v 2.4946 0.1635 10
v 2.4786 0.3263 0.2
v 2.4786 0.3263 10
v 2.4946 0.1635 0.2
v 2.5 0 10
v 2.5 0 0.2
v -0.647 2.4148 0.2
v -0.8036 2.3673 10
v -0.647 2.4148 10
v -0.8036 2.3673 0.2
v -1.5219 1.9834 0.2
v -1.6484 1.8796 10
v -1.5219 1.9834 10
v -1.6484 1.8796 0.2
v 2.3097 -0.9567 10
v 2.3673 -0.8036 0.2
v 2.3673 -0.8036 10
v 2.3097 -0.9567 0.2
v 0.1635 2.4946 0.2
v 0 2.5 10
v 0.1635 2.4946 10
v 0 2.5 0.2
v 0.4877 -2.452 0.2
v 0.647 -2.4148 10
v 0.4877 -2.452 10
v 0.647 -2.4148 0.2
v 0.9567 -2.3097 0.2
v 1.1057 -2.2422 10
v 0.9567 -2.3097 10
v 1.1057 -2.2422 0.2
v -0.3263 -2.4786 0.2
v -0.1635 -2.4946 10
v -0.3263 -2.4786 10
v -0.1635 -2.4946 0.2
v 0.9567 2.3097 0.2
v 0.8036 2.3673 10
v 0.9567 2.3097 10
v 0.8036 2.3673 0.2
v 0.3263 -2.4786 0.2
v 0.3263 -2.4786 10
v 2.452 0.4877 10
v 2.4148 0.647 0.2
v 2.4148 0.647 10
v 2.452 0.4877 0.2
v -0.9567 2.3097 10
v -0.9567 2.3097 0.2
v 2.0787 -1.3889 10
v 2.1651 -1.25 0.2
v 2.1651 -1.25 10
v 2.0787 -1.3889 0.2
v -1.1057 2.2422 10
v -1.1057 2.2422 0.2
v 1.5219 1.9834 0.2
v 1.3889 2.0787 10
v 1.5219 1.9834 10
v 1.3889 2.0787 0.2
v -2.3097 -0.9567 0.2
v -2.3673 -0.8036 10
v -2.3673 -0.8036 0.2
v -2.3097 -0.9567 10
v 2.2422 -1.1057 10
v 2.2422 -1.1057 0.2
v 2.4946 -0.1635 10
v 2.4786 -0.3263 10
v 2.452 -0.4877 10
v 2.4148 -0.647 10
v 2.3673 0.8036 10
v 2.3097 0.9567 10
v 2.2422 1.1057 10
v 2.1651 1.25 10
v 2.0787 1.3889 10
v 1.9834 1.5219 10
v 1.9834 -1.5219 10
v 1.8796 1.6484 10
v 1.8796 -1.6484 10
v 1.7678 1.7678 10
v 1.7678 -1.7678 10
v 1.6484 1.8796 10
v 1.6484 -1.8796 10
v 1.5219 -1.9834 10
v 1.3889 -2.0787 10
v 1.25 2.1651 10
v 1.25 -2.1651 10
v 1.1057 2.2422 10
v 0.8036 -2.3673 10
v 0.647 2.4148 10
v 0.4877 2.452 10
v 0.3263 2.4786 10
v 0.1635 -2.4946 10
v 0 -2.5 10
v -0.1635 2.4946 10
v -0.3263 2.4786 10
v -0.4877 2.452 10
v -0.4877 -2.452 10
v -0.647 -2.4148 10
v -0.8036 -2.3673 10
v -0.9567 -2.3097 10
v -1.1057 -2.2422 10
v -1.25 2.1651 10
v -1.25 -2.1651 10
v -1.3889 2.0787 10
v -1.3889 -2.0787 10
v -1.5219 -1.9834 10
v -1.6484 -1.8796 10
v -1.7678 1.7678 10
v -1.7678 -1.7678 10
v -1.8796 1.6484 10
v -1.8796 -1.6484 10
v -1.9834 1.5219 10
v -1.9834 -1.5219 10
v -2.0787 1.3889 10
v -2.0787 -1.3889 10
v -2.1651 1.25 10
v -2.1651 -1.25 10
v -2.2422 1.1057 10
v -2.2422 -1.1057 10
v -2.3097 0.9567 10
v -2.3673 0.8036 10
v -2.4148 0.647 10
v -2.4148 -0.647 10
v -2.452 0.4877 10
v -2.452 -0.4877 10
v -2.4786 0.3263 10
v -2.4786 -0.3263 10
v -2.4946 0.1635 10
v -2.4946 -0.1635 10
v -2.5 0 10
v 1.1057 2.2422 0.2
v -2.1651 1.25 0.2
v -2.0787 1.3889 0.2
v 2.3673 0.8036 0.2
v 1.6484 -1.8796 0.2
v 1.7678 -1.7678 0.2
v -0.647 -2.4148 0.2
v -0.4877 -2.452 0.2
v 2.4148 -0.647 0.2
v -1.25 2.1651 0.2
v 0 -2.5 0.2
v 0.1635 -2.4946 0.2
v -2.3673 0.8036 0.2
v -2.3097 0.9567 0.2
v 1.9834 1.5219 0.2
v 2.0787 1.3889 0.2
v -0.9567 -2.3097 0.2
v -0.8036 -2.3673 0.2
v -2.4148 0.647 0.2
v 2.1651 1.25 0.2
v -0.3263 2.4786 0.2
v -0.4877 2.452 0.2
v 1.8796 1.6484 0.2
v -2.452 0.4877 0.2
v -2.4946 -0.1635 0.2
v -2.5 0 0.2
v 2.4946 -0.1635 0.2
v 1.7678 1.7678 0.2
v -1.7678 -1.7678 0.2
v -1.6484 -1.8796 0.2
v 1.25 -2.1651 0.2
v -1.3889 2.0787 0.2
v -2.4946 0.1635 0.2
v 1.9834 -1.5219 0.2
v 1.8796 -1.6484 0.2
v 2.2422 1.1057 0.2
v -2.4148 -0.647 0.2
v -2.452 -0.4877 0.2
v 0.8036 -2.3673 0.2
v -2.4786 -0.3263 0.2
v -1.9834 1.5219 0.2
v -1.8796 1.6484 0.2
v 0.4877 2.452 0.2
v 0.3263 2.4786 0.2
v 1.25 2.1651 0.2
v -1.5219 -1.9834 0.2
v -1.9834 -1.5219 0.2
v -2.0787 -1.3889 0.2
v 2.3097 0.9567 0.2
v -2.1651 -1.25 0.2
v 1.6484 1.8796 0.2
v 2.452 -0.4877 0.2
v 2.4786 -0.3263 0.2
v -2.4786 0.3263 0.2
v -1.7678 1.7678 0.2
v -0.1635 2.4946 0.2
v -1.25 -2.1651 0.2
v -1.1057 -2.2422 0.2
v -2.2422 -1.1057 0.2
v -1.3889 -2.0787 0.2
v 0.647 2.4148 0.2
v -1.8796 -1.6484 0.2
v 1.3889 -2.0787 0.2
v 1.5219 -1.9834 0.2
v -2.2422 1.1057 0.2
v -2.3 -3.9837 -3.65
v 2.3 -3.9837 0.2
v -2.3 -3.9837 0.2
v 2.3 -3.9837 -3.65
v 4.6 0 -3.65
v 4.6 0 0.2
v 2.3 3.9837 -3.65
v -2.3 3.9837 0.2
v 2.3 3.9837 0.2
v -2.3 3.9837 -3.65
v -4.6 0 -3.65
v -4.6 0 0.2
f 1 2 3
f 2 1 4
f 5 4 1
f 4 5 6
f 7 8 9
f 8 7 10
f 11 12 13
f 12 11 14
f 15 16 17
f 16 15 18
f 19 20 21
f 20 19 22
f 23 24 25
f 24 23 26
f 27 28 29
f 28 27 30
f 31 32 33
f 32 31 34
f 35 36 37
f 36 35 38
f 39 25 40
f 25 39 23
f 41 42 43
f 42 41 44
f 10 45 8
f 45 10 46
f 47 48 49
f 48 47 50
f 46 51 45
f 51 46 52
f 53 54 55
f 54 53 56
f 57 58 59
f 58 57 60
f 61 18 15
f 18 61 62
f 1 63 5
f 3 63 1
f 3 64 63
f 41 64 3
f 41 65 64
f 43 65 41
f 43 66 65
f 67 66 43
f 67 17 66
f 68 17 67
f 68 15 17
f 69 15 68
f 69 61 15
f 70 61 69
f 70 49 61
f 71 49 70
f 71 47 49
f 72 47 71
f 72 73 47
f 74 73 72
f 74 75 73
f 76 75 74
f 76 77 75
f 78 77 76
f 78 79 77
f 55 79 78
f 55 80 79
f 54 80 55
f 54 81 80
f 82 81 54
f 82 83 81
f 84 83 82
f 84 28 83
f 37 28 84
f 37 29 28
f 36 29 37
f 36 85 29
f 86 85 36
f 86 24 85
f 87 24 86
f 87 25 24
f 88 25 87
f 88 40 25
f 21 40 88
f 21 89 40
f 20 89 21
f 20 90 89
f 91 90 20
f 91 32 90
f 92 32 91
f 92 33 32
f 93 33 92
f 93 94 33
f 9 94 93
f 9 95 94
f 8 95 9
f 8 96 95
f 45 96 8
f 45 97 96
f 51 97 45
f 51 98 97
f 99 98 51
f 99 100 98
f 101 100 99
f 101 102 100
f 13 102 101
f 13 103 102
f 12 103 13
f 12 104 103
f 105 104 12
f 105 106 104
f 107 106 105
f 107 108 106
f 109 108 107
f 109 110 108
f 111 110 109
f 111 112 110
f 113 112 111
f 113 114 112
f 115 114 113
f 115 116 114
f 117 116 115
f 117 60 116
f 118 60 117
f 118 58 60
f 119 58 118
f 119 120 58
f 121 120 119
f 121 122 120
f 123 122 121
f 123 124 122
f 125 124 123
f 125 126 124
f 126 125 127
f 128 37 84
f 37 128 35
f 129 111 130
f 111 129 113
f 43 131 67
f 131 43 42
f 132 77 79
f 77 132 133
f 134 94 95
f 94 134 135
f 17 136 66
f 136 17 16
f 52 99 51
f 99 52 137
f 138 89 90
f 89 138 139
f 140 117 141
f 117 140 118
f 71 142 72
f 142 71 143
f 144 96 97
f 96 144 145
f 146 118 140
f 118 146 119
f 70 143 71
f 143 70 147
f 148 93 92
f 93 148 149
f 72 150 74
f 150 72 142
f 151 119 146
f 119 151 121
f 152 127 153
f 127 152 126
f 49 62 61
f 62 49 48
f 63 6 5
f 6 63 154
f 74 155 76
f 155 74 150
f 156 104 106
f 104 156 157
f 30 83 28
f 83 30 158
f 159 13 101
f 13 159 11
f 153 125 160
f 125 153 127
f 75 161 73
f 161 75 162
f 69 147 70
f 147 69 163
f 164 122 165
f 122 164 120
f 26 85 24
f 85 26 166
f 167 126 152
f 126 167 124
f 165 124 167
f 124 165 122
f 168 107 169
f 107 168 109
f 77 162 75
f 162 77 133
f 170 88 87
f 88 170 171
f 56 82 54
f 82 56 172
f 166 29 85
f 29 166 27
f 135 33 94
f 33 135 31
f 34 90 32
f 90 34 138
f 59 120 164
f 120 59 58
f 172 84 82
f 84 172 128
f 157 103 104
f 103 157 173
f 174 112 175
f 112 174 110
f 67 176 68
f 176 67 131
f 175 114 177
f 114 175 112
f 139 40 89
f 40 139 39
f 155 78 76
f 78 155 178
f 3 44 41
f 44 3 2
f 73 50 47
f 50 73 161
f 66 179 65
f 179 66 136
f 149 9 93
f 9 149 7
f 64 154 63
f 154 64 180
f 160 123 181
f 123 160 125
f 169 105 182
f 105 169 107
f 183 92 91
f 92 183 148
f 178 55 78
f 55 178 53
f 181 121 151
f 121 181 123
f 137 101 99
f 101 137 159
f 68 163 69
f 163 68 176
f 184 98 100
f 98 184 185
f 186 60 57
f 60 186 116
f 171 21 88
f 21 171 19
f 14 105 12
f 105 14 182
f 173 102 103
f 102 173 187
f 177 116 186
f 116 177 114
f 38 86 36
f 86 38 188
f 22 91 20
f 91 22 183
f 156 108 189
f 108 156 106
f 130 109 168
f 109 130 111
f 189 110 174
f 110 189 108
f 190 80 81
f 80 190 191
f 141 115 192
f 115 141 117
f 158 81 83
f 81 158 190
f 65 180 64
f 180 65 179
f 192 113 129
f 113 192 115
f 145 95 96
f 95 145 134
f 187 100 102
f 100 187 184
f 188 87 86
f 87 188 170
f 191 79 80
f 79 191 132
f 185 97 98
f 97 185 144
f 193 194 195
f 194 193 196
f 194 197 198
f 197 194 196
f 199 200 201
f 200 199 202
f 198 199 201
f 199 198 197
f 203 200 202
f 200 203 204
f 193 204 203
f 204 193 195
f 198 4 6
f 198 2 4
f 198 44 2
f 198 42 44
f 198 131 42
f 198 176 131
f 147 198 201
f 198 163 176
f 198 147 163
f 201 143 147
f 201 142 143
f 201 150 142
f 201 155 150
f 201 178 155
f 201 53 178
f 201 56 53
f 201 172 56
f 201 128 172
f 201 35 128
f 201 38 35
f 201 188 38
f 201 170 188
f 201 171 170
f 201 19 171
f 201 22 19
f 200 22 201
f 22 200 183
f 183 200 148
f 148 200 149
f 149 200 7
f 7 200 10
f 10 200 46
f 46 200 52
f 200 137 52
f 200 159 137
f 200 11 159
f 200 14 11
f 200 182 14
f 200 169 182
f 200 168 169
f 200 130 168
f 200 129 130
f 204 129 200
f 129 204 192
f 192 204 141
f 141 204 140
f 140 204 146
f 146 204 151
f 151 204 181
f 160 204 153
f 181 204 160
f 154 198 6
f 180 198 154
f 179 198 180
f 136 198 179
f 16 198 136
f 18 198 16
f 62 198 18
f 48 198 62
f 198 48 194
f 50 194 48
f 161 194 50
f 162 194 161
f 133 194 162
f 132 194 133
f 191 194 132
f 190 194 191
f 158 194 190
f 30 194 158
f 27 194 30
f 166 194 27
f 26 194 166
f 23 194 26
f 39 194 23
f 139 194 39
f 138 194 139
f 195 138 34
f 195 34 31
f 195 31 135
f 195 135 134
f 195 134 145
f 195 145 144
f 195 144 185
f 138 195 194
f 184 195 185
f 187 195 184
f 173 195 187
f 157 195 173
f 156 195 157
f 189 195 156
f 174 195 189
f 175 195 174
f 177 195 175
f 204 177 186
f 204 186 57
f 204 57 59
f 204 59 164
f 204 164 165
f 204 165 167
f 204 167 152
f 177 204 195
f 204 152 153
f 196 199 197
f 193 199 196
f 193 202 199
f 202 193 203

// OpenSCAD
// Hex head screw (single connected solid)
// Specs: shank Ø5.0mm, head Ø9.2mm (across flats), head height 3.65mm, length 10mm

shaft_diameter_mm = 5.0;
head_diameter_mm  = 9.2;   // across flats for $fn=6
head_height_mm    = 3.65;
length_mm         = 10.0;

overlap_mm = 0.2;          // small overlap to guarantee manifold union
$fn = 96;

module hex_head_screw(d_shaft, d_head_af, h_head, L) {
    r_shaft = d_shaft/2;
    r_head  = d_head_af/2;

    union() {
        // Shank: from z=0 to z=L
        translate([0,0,L/2])
            cylinder(h=L, r=r_shaft, center=true);

        // Hex head: sits on top of shank, from z=-h_head to z=0
        translate([0,0,-h_head/2 + overlap_mm/2])
            cylinder(h=h_head + overlap_mm, r=r_head, center=true, $fn=6);
    }
}

hex_head_screw(shaft_diameter_mm, head_diameter_mm, head_height_mm, length_mm);
